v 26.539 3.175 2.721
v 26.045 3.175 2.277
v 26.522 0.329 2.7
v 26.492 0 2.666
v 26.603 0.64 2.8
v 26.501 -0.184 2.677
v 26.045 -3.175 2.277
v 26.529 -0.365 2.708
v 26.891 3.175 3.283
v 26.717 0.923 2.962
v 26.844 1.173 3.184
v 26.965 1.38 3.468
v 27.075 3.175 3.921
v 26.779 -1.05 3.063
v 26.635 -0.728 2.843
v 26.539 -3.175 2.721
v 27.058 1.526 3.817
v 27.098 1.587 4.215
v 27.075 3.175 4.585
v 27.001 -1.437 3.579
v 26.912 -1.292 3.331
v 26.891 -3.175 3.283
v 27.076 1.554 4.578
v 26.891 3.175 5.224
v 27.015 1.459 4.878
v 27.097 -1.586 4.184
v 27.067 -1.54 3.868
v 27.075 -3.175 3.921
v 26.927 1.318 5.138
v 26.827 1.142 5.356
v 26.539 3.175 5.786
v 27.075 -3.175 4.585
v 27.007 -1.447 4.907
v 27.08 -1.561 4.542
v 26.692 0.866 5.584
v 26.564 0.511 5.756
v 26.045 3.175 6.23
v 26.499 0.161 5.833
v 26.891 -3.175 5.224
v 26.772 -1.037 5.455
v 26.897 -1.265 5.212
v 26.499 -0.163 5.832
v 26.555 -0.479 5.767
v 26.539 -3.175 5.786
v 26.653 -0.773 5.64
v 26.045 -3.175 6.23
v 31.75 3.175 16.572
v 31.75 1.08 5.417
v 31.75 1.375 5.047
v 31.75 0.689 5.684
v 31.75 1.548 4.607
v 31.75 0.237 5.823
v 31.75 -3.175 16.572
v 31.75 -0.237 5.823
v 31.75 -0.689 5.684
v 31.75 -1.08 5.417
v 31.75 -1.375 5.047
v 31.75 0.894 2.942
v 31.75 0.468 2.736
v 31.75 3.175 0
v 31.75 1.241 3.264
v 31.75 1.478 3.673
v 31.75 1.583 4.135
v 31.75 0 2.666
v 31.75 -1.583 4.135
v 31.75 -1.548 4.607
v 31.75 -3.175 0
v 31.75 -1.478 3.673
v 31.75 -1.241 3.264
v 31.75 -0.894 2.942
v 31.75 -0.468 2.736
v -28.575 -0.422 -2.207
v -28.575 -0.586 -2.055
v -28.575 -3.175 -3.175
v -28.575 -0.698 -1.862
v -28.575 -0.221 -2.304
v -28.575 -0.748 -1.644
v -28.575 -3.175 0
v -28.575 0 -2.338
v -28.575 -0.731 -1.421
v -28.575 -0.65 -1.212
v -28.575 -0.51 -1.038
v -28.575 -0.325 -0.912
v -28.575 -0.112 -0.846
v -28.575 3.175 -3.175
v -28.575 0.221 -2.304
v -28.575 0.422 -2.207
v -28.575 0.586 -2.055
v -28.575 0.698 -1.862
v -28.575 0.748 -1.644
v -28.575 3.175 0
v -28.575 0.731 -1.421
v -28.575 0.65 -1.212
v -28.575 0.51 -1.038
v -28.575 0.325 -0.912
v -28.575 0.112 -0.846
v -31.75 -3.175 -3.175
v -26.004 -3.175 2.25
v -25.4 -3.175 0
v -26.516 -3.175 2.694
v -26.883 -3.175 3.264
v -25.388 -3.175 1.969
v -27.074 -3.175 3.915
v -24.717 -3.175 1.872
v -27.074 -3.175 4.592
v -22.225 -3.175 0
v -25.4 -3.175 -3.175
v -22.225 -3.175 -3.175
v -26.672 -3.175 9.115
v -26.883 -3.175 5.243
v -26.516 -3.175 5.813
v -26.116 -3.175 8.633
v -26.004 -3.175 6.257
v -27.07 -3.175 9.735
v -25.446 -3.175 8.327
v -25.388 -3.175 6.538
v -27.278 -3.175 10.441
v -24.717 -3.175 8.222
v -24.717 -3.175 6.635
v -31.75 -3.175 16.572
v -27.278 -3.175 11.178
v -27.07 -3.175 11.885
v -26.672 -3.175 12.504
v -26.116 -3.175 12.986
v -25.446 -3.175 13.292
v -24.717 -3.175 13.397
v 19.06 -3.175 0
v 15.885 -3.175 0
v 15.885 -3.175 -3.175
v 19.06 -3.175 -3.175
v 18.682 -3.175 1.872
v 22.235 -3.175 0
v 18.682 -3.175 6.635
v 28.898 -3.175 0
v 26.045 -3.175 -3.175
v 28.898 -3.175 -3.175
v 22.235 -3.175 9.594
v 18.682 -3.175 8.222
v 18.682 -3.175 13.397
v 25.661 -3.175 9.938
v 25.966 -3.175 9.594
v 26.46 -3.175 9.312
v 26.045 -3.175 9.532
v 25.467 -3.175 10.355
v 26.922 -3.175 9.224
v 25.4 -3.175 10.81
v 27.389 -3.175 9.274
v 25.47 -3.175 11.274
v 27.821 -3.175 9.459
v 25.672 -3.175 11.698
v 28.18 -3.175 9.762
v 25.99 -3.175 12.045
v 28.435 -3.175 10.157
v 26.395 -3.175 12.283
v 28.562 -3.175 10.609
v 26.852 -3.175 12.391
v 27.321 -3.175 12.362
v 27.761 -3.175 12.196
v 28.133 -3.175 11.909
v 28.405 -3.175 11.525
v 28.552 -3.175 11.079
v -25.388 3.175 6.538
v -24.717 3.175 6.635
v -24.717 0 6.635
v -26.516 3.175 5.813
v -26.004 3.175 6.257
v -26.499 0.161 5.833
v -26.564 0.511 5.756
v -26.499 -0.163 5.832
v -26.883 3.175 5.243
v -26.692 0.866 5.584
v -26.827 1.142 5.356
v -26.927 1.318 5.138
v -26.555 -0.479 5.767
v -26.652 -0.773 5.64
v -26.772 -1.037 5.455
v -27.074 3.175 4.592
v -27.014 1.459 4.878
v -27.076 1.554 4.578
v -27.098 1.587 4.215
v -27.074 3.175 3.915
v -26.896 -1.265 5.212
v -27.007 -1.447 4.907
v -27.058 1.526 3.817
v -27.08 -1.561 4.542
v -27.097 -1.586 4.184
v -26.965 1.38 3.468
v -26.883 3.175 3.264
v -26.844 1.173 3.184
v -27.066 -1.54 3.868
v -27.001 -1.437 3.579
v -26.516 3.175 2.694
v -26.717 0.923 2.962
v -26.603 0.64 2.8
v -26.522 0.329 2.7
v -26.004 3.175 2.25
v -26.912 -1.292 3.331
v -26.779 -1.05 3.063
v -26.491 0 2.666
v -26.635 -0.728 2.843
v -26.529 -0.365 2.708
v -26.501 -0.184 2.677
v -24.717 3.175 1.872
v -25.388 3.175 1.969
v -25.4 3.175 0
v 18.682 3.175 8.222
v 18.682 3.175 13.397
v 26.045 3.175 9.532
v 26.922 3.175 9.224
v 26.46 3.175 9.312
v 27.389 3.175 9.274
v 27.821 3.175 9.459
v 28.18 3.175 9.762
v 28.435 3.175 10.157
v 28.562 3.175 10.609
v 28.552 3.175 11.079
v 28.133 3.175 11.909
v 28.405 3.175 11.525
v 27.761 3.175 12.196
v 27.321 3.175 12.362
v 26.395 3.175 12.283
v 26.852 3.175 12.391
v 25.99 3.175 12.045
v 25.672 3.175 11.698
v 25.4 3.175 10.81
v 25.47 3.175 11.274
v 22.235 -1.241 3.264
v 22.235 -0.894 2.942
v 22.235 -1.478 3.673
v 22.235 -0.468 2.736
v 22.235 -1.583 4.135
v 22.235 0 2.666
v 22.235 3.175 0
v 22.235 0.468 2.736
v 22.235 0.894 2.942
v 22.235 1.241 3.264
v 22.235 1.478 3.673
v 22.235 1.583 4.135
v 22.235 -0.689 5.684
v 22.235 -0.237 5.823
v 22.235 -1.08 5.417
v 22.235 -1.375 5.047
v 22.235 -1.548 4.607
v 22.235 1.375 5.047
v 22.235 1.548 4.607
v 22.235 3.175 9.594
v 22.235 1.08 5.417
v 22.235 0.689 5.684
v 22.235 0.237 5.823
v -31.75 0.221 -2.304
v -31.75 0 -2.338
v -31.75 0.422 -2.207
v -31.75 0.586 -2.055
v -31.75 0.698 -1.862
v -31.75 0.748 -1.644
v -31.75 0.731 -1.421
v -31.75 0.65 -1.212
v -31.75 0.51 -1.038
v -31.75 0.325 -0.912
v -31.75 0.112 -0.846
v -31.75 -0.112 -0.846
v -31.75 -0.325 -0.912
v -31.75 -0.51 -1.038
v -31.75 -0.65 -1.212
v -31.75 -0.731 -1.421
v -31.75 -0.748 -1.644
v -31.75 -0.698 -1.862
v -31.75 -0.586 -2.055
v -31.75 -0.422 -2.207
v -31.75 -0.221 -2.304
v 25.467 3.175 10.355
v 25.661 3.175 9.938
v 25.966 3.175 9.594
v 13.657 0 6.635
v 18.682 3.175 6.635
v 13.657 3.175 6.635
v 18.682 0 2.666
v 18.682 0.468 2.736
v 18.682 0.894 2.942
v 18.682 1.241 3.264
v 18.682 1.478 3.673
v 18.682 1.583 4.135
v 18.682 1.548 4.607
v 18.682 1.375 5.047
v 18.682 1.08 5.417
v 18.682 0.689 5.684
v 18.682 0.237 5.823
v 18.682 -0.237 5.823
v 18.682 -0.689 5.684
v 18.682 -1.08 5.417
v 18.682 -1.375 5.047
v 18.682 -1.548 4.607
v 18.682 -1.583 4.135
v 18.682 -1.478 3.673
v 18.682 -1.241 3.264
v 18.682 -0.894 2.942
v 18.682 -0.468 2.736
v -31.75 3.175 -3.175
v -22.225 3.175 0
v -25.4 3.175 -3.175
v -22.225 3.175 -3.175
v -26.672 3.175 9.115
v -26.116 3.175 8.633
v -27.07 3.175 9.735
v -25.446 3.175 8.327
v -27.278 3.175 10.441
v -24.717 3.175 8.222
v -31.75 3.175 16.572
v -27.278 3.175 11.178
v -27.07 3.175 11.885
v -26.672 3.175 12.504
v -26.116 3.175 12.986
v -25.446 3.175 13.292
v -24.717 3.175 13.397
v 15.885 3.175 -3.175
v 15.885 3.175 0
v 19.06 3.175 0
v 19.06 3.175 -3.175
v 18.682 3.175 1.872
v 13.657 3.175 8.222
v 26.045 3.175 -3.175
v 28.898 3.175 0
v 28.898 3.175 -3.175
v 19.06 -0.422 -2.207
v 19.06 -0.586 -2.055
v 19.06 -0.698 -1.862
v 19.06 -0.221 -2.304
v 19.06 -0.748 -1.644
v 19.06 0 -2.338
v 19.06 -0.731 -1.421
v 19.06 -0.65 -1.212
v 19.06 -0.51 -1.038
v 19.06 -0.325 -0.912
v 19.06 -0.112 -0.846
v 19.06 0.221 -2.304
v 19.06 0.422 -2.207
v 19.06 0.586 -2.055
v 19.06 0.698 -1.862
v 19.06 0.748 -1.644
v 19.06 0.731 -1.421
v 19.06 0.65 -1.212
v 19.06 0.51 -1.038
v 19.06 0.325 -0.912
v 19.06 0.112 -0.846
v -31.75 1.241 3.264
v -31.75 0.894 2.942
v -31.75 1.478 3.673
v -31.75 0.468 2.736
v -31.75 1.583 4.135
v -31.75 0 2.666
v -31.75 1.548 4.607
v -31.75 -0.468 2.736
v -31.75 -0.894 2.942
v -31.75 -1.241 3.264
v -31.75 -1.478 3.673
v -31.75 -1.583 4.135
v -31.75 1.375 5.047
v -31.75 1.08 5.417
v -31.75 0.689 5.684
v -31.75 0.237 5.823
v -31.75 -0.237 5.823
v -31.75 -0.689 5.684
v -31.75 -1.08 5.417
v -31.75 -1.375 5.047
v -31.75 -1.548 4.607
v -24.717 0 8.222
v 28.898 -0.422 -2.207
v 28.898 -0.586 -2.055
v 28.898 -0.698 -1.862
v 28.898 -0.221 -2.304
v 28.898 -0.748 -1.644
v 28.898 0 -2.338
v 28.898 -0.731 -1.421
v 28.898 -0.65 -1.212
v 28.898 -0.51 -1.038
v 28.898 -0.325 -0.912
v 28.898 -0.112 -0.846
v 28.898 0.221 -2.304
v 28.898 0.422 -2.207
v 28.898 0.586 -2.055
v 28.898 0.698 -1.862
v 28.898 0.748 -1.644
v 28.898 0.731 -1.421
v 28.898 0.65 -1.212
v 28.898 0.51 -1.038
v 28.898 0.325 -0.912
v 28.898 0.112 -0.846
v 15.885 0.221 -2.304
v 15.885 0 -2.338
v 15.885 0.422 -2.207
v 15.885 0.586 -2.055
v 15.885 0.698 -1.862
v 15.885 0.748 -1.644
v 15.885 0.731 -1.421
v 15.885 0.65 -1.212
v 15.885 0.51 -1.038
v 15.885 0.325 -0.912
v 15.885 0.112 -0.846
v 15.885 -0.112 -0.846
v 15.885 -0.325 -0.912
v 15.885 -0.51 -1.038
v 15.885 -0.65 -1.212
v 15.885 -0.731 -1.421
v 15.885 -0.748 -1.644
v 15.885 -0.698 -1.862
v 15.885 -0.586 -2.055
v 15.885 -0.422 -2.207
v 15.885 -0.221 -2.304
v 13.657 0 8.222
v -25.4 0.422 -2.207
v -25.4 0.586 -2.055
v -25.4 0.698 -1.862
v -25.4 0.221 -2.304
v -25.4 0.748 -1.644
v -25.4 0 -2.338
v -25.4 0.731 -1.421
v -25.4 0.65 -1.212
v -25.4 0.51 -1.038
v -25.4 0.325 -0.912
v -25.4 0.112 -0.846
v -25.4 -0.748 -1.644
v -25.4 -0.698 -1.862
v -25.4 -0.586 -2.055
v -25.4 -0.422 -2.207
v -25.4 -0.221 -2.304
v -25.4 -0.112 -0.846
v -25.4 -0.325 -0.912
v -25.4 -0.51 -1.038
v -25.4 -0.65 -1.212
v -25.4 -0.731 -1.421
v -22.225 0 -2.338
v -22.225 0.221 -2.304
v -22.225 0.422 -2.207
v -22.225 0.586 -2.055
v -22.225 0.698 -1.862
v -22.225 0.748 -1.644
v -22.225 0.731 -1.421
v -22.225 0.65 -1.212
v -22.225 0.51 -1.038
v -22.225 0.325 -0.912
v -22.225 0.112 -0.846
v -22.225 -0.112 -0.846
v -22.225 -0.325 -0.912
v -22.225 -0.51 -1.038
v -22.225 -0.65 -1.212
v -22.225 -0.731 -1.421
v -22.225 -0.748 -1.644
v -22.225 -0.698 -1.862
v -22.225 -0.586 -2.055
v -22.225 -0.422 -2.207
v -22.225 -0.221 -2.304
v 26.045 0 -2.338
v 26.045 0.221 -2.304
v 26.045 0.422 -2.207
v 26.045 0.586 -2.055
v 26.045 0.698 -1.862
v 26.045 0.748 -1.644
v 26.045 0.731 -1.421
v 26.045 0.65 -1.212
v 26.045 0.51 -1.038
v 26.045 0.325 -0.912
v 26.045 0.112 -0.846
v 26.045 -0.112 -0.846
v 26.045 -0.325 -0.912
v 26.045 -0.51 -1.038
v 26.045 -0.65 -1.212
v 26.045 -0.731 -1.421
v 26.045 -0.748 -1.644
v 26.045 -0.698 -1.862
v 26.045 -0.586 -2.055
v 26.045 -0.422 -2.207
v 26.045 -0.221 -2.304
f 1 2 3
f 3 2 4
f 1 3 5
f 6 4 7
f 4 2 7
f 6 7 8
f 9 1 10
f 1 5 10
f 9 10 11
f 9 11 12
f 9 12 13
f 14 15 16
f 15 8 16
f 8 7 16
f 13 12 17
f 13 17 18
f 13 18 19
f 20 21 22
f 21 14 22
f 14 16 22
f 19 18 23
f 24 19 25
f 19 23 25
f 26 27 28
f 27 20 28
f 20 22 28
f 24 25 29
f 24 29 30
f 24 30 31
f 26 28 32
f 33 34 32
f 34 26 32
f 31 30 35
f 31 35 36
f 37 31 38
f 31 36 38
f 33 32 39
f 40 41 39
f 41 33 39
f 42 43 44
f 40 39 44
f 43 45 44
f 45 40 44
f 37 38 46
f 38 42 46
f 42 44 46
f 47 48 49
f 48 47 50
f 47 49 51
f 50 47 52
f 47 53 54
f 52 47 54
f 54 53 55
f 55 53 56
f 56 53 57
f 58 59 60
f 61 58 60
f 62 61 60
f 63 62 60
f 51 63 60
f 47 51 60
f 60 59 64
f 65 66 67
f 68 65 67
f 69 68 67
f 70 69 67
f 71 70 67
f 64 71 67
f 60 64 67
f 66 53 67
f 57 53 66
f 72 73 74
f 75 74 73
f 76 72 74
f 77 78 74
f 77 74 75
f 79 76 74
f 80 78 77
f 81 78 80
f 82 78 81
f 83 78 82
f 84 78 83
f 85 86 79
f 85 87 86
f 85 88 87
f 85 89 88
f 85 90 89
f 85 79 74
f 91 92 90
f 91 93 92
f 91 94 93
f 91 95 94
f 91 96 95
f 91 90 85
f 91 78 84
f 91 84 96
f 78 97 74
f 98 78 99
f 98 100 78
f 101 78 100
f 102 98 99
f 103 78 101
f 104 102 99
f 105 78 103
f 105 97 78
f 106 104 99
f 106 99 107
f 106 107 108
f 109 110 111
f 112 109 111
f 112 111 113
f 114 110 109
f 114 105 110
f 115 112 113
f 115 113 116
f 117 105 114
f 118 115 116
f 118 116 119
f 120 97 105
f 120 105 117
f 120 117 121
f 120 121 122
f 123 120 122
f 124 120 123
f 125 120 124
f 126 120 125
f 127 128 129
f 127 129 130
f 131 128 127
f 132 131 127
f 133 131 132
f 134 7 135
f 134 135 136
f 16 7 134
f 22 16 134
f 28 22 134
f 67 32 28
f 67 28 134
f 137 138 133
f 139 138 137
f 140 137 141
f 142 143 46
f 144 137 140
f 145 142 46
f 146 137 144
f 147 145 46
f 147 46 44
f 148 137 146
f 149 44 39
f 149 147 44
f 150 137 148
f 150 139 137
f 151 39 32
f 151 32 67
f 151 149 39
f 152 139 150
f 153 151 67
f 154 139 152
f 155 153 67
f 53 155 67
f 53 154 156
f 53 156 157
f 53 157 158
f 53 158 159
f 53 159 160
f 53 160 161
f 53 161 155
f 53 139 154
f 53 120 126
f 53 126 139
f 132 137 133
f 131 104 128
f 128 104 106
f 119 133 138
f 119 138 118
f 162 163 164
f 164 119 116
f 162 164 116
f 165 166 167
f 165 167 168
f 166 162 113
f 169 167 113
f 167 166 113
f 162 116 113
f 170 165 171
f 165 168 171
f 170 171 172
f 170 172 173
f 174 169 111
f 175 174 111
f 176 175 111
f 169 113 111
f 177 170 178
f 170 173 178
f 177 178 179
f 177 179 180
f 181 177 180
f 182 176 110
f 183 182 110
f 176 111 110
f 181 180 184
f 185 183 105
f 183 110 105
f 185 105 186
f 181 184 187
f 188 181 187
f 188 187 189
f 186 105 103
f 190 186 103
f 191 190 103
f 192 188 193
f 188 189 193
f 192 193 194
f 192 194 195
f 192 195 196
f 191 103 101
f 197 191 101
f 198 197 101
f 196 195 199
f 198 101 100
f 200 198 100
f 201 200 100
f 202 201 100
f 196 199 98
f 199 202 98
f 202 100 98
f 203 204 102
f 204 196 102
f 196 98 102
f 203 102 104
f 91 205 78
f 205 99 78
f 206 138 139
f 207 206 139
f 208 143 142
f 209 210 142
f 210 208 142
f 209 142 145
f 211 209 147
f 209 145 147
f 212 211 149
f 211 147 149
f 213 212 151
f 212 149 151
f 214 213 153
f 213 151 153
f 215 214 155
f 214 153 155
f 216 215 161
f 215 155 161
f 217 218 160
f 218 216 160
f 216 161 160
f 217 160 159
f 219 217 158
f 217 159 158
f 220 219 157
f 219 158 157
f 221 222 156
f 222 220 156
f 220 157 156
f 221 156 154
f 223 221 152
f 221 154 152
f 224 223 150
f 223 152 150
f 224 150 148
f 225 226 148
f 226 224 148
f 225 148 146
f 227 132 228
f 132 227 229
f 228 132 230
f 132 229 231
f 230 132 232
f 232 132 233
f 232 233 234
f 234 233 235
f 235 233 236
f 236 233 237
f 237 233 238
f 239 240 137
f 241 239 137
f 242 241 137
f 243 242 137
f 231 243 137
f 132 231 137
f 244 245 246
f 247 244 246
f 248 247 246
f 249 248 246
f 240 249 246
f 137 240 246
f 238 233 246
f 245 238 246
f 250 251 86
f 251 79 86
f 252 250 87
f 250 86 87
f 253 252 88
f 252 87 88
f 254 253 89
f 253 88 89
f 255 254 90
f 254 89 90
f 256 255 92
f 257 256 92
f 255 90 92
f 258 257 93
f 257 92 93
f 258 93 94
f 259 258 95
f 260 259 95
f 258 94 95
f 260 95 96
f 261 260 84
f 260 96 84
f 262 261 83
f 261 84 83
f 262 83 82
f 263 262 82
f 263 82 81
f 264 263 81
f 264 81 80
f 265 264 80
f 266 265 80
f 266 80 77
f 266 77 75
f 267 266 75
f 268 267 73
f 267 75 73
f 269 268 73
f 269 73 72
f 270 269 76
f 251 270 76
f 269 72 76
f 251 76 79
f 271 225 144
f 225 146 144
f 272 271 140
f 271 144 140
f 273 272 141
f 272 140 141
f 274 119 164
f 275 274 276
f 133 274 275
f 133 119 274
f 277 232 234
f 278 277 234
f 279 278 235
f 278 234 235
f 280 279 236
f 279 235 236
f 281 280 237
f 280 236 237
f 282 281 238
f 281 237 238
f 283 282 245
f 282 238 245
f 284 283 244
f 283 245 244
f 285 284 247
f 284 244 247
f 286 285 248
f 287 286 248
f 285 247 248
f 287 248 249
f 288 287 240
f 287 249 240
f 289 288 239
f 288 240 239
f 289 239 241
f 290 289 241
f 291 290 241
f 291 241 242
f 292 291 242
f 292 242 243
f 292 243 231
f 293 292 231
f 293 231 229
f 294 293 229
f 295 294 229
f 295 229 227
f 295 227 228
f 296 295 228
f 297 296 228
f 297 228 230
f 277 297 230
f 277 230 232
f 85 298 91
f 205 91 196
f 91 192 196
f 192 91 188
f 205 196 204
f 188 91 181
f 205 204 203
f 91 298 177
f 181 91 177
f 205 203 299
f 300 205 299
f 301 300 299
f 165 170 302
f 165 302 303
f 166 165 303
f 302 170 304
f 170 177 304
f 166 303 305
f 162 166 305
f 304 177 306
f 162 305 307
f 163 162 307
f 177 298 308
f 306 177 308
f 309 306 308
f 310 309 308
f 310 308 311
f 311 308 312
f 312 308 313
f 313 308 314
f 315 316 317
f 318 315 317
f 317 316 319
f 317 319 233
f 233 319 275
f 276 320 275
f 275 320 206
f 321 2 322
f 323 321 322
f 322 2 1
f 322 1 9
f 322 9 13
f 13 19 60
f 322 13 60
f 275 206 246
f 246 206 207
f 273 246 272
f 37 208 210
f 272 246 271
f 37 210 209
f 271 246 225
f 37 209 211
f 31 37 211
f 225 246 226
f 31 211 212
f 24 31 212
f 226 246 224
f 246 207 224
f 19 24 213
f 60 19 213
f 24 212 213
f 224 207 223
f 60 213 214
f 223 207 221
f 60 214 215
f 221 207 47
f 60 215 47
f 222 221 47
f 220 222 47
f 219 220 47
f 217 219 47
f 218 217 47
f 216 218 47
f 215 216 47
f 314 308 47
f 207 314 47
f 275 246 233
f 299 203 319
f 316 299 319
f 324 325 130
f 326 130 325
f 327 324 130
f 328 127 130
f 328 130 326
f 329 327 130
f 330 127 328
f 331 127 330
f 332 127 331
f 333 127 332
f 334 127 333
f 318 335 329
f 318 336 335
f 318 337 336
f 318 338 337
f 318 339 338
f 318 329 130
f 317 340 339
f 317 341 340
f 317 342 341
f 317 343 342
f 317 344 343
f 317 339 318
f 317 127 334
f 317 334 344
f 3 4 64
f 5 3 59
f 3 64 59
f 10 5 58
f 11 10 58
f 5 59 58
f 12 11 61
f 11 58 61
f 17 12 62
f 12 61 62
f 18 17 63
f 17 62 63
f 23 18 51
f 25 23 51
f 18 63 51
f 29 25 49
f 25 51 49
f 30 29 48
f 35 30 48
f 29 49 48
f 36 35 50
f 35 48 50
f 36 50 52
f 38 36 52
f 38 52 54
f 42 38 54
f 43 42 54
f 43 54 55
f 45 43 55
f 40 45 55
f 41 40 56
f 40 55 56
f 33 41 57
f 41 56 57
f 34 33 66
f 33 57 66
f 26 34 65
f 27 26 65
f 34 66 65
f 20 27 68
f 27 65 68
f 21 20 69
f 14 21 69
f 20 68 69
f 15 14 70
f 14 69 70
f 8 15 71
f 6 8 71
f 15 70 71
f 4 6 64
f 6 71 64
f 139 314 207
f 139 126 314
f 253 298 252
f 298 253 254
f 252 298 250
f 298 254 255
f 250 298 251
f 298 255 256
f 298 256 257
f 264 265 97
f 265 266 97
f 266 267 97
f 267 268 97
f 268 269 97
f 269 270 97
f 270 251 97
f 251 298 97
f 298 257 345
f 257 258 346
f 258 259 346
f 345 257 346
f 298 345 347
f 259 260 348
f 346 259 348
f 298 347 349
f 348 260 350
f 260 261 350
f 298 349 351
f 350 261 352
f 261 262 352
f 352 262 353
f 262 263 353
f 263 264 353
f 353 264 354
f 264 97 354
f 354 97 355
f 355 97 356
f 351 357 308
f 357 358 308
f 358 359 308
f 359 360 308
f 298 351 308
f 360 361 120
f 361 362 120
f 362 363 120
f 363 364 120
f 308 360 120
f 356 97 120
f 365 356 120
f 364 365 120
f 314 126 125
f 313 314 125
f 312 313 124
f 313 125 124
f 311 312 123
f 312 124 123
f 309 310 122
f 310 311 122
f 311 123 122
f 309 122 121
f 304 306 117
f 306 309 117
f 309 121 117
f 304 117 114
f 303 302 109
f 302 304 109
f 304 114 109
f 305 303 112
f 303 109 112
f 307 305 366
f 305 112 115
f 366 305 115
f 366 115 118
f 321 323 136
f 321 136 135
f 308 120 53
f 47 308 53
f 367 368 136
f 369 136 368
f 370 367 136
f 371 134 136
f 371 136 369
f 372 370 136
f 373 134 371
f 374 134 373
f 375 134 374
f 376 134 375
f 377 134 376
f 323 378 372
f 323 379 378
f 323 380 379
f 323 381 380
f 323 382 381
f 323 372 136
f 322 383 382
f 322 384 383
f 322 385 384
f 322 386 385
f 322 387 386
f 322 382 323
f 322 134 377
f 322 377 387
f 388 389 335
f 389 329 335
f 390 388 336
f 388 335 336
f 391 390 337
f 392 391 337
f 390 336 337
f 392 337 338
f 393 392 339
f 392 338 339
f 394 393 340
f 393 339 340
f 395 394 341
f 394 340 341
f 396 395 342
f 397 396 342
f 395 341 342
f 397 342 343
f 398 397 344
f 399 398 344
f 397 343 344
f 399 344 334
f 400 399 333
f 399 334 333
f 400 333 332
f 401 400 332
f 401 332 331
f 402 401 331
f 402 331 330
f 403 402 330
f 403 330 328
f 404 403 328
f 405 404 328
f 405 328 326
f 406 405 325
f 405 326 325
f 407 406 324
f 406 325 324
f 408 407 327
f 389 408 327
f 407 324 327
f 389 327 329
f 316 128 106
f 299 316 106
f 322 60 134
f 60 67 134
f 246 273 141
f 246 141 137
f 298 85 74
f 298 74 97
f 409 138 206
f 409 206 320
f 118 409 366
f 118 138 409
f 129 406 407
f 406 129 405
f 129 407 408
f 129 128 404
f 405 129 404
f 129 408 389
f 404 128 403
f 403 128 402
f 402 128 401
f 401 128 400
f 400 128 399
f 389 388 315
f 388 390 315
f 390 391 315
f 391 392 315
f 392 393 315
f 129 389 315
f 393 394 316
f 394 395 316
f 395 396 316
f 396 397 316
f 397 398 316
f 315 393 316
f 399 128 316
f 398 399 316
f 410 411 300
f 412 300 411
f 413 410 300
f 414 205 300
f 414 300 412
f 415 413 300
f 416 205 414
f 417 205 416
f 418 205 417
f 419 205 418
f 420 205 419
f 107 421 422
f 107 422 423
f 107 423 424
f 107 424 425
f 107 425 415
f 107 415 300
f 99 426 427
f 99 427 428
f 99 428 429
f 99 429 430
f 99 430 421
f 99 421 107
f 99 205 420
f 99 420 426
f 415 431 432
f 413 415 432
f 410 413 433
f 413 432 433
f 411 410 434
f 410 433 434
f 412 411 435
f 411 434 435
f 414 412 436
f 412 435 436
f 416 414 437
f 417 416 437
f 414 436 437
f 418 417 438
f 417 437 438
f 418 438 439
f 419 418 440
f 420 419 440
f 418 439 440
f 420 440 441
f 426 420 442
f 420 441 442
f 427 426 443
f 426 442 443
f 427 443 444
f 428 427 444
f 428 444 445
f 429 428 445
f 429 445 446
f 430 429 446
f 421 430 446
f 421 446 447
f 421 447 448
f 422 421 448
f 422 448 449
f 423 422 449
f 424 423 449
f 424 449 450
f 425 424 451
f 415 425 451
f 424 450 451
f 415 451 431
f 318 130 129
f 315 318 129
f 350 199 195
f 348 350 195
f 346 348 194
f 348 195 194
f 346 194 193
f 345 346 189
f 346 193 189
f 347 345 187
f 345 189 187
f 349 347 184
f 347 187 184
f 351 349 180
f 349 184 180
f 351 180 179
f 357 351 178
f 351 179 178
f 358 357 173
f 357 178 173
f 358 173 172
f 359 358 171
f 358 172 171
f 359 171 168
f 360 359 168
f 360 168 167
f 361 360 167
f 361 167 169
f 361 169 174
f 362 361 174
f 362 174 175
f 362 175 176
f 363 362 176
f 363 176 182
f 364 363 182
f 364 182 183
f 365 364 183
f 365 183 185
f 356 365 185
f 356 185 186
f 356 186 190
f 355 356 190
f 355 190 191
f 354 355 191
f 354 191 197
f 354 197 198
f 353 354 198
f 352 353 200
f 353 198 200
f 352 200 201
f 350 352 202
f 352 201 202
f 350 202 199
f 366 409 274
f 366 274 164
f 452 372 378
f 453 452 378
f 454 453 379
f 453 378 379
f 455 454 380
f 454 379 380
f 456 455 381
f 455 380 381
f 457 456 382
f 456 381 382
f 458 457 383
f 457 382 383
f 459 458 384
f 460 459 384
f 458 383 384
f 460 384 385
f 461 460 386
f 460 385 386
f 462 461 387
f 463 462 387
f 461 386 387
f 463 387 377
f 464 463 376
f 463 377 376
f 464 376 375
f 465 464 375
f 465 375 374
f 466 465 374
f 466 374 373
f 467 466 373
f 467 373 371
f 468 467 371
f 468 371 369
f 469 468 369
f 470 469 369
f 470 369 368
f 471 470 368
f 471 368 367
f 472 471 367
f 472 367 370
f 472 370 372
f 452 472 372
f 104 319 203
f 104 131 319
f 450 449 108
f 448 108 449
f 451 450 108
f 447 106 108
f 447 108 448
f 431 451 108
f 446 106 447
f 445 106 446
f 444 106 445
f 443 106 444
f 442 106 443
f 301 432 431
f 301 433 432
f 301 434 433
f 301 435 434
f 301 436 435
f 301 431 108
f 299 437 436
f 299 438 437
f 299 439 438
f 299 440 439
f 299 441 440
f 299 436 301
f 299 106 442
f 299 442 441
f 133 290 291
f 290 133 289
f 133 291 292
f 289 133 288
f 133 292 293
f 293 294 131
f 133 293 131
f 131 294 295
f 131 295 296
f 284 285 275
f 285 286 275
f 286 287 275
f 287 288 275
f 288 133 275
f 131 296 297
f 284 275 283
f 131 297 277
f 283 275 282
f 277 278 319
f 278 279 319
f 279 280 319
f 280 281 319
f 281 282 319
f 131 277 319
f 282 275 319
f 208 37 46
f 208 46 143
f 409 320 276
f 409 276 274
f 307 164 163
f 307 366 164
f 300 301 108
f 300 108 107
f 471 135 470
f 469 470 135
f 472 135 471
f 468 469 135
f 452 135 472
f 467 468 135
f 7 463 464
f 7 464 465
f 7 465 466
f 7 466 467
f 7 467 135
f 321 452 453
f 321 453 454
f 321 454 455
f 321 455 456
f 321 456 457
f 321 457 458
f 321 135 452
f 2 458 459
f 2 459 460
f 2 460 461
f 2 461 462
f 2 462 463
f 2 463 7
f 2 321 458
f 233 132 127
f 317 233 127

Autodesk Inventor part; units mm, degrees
ref_plane "YZ Plane" through (0, 0, 0) normal (1, 0, 0) x (0, 1, 0)
ref_plane "XZ Plane" through (0, 0, 0) normal (0, 1, 0) x (-1, 0, 0)
ref_plane "XY Plane" through (0, 0, 0) normal (0, 0, 1) x (1, 0, 0)
sketch "Sketch1" plane through (0, 0, 0) normal (0, 1, 0) x (-1, 0, 0)
  line L0 (31.75, -3.048) -> (-31.75, -3.048)
  line L1 (-31.75, -3.048) -> (-31.75, 0)
  line L2 (-31.75, 0) -> (31.75, 0)
  line L3 (31.75, 0) -> (31.75, -3.048)
  line L4 (-31.75, 0) -> (31.75, 0)
  line L5 (31.75, 0) -> (31.75, 16.5722)
  line L6 (31.75, 16.5722) -> (-31.75, 16.5722)
  line L7 (-31.75, 16.5722) -> (-31.75, 0)
  line L8 (24.7167, 10.8097) -> (-19.6375, 10.8097) construction
  line L9 (24.7167, 13.3972) -> (-19.6375, 13.3972)
  line L10 (-19.6375, 8.2222) -> (24.7167, 8.2222)
  arc A0 (24.7167, 8.2222) -> (24.7167, 13.3972) centre (24.7167, 10.8097) ccw
  arc A1 (-19.6375, 13.3972) -> (-19.6375, 8.2222) centre (-19.6375, 10.8097) ccw
  line L11 (24.7167, 4.2534) -> (-24.7167, 4.2534) construction
  line L12 (24.7167, 6.6347) -> (-24.7167, 6.6347)
  line L13 (-24.7167, 1.8722) -> (24.7167, 1.8722)
  arc A2 (24.7167, 1.8722) -> (24.7167, 6.6347) centre (24.7167, 4.2534) ccw
  arc A3 (-24.7167, 6.6347) -> (-24.7167, 1.8722) centre (-24.7167, 4.2534) ccw
  line L14 (0, 0) -> (0, 22.7513) construction
  circle A4 centre (-26.9875, 10.8097) radius 1.5875
  point P0 (0, 4.2534)
  dimension "d5" = 49.4334
  dimension "d6" = 5.175
  dimension "d7" = 4.7625
  dimension "d8" = 4.2534
  dimension "d23" = 7.0333
  dimension "d24" = 3.175
  dimension "d25" = 3.175
  dimension "d26" = 3.175
  dimension "d27" = 1.5875
  dimension "d28" = 3.175
extrude "Extrusion1" add sketch "Sketch1" along normal mid plane 6.35 contours L2 L7 L6 L5
sketch "Sketch3" plane through (0, 3.175, 0) normal (0, 1, 0) x (1, 0, 0)
  arc A0 (24.7167, -6.6347) -> (24.7167, -1.8722) centre (24.7167, -4.2534) ccw projected
  line L0 (24.7167, -4.2534) -> (4.7773, -4.2534) construction
  line L1 (26.045, -9.5942) -> (22.235, -9.5942)
  line L2 (22.235, -9.5942) -> (22.235, 1.0874)
  line L3 (22.235, 1.0874) -> (26.045, 1.0874)
  line L4 (26.045, 1.0874) -> (26.045, -9.5942)
  line L5 (26.045, -9.5942) -> (22.235, 1.0874) construction
  line L6 (22.235, -9.5942) -> (26.045, 1.0874) construction
  point P0 (0, 0)
  point P1 (24.14, -4.2534)
  dimension "d14" = 10.6816
  dimension "d15" = 3.81
extrude "Extrusion3" cut sketch "Sketch3" against normal through all contours L4 L1 L2 L3
sketch "Sketch4" plane through (0, 3.175, 0) normal (0, 1, 0) x (1, 0, 0)
  line L0 (22.235, -6.6347) -> (-24.7167, -6.6347) projected
  line L1 (22.235, -1.8722) -> (-24.7167, -1.8722) projected
  line L2 (22.235, -6.6347) -> (18.6822, -6.6347)
  line L3 (18.6822, -6.6347) -> (18.6822, -1.8722)
  line L4 (18.6822, -1.8722) -> (22.235, -1.8722)
  line L5 (22.235, -1.8722) -> (22.235, -6.6347)
  point P0 (0, 0)
  point P1 (22.235, -1.8722)
  point P2 (18.6822, -6.6347)
extrude "Extrusion4" add sketch "Sketch4" against normal up to surface (6.35 mm away)
sketch "Sketch2" plane through (31.75, -3.175, 0) normal (1, 0, 0) x (0, 0, -1)
  line L0 (0, 3.175) -> (-16.5722, 3.175) construction
  line L1 (-16.5722, 6.35) -> (-16.5722, 0) construction
  line L2 (-6.6347, 0) -> (-6.6347, 6.35) construction
  line L3 (-1.8722, 6.35) -> (-1.8722, 0) construction
  circle A0 centre (-4.2534, 3.175) radius 1.5875
  line L4 (-6.6347, 0) -> (-6.6347, 6.35) construction
  line L5 (-6.6347, -1.3931) -> (-4.2534, -1.3931) construction
  line L6 (-1.8722, 0) -> (-1.8722, 6.35) construction
  line L7 (-1.8722, -1.3931) -> (-4.2534, -1.3931) construction
  line L8 (-4.2534, -1.3931) -> (-4.2534, 6.8506) construction
  line L9 (-6.6347, 6.35) -> (-6.6347, 0) projected
  line L10 (-1.8722, 0) -> (-1.8722, 6.35) projected
  point P0 (-7.4284, 6.35)
  point P1 (-7.4284, 0)
  dimension "d9" = 3.175
extrude "Extrusion2" cut sketch "Sketch2" against normal through all
sketch "Sketch5" plane through (-24.7167, 3.175, 8.2222) normal (0, 0, 1) x (1, 0, 0)
  line L0 (24.7167, -3.175) -> (0, -3.175) construction
  line L1 (0, -6.35) -> (0, 0) construction
  line L2 (38.3736, -3.175) -> (0, -3.175)
  line L3 (0, -3.175) -> (0, 0)
  line L4 (0, 0) -> (38.3736, 0)
  line L5 (38.3736, 0) -> (38.3736, -3.175)
  line L6 (38.3736, -3.175) -> (0, 0) construction
  line L7 (0, -3.175) -> (38.3736, 0) construction
  line L8 (0, -6.35) -> (43.3989, -6.35) projected
  line L9 (43.3989, 0) -> (0, 0) projected
  point P0 (0, -3.175)
  dimension "d18" = 3.175
  dimension "d44" = 38.3736
extrude "Extrusion5" cut sketch "Sketch5" against normal up to next
sketch "Sketch6" plane through (31.75, -3.175, 0) normal (0, 0, -1) x (-1, 0, 0)
  line L0 (0, 7.366) -> (0, -4.826) projected
  line L1 (0, 6.35) -> (5.705, 6.35) projected
  line L2 (5.705, 0) -> (5.705, 6.35) projected
  line L3 (5.705, 0) -> (0, 0) projected
  line L4 (9.515, 6.35) -> (9.515, 0) projected
  line L5 (63.5, 0) -> (9.515, 0) projected
  line L6 (9.515, 0) -> (15.865, 0)
  line L7 (15.865, 0) -> (15.865, 6.35)
  line L8 (15.865, 6.35) -> (9.515, 6.35)
  line L9 (9.515, 6.35) -> (9.515, 0)
  line L10 (2.8525, 0) -> (2.8525, 6.35)
  line L11 (12.69, 0) -> (12.69, 6.35)
  line L12 (9.515, 6.35) -> (63.5, 6.35) projected
  line L13 (63.5, 0) -> (63.5, 6.35) projected
  line L14 (63.5, 0) -> (60.325, 0)
  line L15 (60.325, 0) -> (60.325, 6.35)
  line L16 (60.325, 6.35) -> (63.5, 6.35)
  line L17 (63.5, 6.35) -> (63.5, 0)
  line L18 (57.15, 0) -> (53.975, 0)
  line L19 (53.975, 0) -> (53.975, 6.35)
  line L20 (53.975, 6.35) -> (57.15, 6.35)
  line L21 (57.15, 6.35) -> (57.15, 0)
  point P0 (31.75, 3.175)
  point P1 (15.865, 0)
  point P2 (12.69, 0)
  dimension "d37" = 3.175
  dimension "d38" = 3.175
  dimension "d39" = 3.175
  dimension "d40" = 3.175
  dimension "d41" = 3.175
extrude "Extrusion6" add sketch "Sketch6" along normal blind 3.175 contours L1 L2 L3 L10 | L8 L7 L5 L11 | L12 L21 L5 L19 | L12 L13 L5 L15
sketch "Sketch7" plane through (31.75, -3.175, 16.5722) normal (1, 0, 0) x (0, 0, -1)
  circle A0 centre (18.1597, 3.175) radius 0.75
  line L0 (16.5722, 3.175) -> (19.7472, 3.175)
  line L1 (16.5722, 0) -> (0, 0) projected
  line L2 (0, 6.35) -> (16.5722, 6.35) projected
  line L3 (19.7472, 6.35) -> (19.7472, 0) projected
  dimension "d32" = 1.5
  dimension "d33" = 1.5875
extrude "Extrusion7" cut sketch "Sketch7" against normal through all
sketch "Sketch8" plane through (0, -3.175, 0) normal (0, -1, 0) x (1, 0, 0)
  line L0 (22.235, 0) -> (22.235, 9.5942) projected
  line L1 (22.235, 9.5942) -> (25.9663, 9.5942) projected
  arc A0 (26.045, 9.5323) -> (25.9663, 9.5942) centre (26.9875, 10.8097) ccw projected
  line L2 (26.045, 9.5323) -> (26.045, 6.2298) projected
  arc A1 (26.045, 2.277) -> (26.045, 6.2298) centre (24.7167, 4.2534) ccw projected
  line L3 (26.045, 2.277) -> (26.045, -3.175) projected
  line L4 (28.8975, -3.175) -> (26.045, -3.175) projected
  line L5 (28.8975, 0) -> (28.8975, -3.175) projected
  line L6 (28.8975, 0) -> (31.75, 0) projected
  line L7 (31.75, 0) -> (31.75, 16.5722) projected
  line L8 (31.75, 16.5722) -> (-31.75, 16.5722) projected
  line L9 (-31.75, 16.5722) -> (-31.75, -3.175) projected
  line L10 (-28.575, -3.175) -> (-31.75, -3.175) projected
  line L11 (-28.575, 0) -> (-28.575, -3.175) projected
  line L12 (-28.575, 0) -> (-25.4, 0) projected
  line L13 (-25.4, 0) -> (-25.4, -3.175) projected
  line L14 (-22.225, -3.175) -> (-25.4, -3.175) projected
  line L15 (-22.225, 0) -> (-22.225, -3.175) projected
  line L16 (-22.225, 0) -> (15.885, 0) projected
  line L17 (15.885, 0) -> (15.885, -3.175) projected
  line L18 (19.06, -3.175) -> (15.885, -3.175) projected
  line L19 (19.06, 0) -> (19.06, -3.175) projected
  line L20 (19.06, 0) -> (22.235, 0) projected
  line L21 (-24.7167, 13.3972) -> (19.6375, 13.3972) projected
  arc A2 (19.6375, 8.2222) -> (19.6375, 13.3972) centre (19.6375, 10.8097) ccw projected
  line L22 (19.6375, 8.2222) -> (-24.7167, 8.2222) projected
  arc A3 (-24.7167, 13.3972) -> (-24.7167, 8.2222) centre (-24.7167, 10.8097) ccw projected
  line L23 (18.6822, 6.6347) -> (18.6822, 1.8722) projected
  line L24 (18.6822, 1.8722) -> (-24.7167, 1.8722) projected
  arc A4 (-24.7167, 6.6347) -> (-24.7167, 1.8722) centre (-24.7167, 4.2534) ccw projected
  line L25 (-24.7167, 6.6347) -> (18.6822, 6.6347) projected
  line L26 (19.6375, 8.2222) -> (-24.7167, 8.2222) projected
  line L27 (18.6822, 8.2222) -> (18.6822, 13.3972)
  point P0 (0, 0)
extrude "Extrusion8" add sketch "Sketch8" against normal blind 6.35 contours L21 A2 L22 L27
properties part number "_3DPrint"
